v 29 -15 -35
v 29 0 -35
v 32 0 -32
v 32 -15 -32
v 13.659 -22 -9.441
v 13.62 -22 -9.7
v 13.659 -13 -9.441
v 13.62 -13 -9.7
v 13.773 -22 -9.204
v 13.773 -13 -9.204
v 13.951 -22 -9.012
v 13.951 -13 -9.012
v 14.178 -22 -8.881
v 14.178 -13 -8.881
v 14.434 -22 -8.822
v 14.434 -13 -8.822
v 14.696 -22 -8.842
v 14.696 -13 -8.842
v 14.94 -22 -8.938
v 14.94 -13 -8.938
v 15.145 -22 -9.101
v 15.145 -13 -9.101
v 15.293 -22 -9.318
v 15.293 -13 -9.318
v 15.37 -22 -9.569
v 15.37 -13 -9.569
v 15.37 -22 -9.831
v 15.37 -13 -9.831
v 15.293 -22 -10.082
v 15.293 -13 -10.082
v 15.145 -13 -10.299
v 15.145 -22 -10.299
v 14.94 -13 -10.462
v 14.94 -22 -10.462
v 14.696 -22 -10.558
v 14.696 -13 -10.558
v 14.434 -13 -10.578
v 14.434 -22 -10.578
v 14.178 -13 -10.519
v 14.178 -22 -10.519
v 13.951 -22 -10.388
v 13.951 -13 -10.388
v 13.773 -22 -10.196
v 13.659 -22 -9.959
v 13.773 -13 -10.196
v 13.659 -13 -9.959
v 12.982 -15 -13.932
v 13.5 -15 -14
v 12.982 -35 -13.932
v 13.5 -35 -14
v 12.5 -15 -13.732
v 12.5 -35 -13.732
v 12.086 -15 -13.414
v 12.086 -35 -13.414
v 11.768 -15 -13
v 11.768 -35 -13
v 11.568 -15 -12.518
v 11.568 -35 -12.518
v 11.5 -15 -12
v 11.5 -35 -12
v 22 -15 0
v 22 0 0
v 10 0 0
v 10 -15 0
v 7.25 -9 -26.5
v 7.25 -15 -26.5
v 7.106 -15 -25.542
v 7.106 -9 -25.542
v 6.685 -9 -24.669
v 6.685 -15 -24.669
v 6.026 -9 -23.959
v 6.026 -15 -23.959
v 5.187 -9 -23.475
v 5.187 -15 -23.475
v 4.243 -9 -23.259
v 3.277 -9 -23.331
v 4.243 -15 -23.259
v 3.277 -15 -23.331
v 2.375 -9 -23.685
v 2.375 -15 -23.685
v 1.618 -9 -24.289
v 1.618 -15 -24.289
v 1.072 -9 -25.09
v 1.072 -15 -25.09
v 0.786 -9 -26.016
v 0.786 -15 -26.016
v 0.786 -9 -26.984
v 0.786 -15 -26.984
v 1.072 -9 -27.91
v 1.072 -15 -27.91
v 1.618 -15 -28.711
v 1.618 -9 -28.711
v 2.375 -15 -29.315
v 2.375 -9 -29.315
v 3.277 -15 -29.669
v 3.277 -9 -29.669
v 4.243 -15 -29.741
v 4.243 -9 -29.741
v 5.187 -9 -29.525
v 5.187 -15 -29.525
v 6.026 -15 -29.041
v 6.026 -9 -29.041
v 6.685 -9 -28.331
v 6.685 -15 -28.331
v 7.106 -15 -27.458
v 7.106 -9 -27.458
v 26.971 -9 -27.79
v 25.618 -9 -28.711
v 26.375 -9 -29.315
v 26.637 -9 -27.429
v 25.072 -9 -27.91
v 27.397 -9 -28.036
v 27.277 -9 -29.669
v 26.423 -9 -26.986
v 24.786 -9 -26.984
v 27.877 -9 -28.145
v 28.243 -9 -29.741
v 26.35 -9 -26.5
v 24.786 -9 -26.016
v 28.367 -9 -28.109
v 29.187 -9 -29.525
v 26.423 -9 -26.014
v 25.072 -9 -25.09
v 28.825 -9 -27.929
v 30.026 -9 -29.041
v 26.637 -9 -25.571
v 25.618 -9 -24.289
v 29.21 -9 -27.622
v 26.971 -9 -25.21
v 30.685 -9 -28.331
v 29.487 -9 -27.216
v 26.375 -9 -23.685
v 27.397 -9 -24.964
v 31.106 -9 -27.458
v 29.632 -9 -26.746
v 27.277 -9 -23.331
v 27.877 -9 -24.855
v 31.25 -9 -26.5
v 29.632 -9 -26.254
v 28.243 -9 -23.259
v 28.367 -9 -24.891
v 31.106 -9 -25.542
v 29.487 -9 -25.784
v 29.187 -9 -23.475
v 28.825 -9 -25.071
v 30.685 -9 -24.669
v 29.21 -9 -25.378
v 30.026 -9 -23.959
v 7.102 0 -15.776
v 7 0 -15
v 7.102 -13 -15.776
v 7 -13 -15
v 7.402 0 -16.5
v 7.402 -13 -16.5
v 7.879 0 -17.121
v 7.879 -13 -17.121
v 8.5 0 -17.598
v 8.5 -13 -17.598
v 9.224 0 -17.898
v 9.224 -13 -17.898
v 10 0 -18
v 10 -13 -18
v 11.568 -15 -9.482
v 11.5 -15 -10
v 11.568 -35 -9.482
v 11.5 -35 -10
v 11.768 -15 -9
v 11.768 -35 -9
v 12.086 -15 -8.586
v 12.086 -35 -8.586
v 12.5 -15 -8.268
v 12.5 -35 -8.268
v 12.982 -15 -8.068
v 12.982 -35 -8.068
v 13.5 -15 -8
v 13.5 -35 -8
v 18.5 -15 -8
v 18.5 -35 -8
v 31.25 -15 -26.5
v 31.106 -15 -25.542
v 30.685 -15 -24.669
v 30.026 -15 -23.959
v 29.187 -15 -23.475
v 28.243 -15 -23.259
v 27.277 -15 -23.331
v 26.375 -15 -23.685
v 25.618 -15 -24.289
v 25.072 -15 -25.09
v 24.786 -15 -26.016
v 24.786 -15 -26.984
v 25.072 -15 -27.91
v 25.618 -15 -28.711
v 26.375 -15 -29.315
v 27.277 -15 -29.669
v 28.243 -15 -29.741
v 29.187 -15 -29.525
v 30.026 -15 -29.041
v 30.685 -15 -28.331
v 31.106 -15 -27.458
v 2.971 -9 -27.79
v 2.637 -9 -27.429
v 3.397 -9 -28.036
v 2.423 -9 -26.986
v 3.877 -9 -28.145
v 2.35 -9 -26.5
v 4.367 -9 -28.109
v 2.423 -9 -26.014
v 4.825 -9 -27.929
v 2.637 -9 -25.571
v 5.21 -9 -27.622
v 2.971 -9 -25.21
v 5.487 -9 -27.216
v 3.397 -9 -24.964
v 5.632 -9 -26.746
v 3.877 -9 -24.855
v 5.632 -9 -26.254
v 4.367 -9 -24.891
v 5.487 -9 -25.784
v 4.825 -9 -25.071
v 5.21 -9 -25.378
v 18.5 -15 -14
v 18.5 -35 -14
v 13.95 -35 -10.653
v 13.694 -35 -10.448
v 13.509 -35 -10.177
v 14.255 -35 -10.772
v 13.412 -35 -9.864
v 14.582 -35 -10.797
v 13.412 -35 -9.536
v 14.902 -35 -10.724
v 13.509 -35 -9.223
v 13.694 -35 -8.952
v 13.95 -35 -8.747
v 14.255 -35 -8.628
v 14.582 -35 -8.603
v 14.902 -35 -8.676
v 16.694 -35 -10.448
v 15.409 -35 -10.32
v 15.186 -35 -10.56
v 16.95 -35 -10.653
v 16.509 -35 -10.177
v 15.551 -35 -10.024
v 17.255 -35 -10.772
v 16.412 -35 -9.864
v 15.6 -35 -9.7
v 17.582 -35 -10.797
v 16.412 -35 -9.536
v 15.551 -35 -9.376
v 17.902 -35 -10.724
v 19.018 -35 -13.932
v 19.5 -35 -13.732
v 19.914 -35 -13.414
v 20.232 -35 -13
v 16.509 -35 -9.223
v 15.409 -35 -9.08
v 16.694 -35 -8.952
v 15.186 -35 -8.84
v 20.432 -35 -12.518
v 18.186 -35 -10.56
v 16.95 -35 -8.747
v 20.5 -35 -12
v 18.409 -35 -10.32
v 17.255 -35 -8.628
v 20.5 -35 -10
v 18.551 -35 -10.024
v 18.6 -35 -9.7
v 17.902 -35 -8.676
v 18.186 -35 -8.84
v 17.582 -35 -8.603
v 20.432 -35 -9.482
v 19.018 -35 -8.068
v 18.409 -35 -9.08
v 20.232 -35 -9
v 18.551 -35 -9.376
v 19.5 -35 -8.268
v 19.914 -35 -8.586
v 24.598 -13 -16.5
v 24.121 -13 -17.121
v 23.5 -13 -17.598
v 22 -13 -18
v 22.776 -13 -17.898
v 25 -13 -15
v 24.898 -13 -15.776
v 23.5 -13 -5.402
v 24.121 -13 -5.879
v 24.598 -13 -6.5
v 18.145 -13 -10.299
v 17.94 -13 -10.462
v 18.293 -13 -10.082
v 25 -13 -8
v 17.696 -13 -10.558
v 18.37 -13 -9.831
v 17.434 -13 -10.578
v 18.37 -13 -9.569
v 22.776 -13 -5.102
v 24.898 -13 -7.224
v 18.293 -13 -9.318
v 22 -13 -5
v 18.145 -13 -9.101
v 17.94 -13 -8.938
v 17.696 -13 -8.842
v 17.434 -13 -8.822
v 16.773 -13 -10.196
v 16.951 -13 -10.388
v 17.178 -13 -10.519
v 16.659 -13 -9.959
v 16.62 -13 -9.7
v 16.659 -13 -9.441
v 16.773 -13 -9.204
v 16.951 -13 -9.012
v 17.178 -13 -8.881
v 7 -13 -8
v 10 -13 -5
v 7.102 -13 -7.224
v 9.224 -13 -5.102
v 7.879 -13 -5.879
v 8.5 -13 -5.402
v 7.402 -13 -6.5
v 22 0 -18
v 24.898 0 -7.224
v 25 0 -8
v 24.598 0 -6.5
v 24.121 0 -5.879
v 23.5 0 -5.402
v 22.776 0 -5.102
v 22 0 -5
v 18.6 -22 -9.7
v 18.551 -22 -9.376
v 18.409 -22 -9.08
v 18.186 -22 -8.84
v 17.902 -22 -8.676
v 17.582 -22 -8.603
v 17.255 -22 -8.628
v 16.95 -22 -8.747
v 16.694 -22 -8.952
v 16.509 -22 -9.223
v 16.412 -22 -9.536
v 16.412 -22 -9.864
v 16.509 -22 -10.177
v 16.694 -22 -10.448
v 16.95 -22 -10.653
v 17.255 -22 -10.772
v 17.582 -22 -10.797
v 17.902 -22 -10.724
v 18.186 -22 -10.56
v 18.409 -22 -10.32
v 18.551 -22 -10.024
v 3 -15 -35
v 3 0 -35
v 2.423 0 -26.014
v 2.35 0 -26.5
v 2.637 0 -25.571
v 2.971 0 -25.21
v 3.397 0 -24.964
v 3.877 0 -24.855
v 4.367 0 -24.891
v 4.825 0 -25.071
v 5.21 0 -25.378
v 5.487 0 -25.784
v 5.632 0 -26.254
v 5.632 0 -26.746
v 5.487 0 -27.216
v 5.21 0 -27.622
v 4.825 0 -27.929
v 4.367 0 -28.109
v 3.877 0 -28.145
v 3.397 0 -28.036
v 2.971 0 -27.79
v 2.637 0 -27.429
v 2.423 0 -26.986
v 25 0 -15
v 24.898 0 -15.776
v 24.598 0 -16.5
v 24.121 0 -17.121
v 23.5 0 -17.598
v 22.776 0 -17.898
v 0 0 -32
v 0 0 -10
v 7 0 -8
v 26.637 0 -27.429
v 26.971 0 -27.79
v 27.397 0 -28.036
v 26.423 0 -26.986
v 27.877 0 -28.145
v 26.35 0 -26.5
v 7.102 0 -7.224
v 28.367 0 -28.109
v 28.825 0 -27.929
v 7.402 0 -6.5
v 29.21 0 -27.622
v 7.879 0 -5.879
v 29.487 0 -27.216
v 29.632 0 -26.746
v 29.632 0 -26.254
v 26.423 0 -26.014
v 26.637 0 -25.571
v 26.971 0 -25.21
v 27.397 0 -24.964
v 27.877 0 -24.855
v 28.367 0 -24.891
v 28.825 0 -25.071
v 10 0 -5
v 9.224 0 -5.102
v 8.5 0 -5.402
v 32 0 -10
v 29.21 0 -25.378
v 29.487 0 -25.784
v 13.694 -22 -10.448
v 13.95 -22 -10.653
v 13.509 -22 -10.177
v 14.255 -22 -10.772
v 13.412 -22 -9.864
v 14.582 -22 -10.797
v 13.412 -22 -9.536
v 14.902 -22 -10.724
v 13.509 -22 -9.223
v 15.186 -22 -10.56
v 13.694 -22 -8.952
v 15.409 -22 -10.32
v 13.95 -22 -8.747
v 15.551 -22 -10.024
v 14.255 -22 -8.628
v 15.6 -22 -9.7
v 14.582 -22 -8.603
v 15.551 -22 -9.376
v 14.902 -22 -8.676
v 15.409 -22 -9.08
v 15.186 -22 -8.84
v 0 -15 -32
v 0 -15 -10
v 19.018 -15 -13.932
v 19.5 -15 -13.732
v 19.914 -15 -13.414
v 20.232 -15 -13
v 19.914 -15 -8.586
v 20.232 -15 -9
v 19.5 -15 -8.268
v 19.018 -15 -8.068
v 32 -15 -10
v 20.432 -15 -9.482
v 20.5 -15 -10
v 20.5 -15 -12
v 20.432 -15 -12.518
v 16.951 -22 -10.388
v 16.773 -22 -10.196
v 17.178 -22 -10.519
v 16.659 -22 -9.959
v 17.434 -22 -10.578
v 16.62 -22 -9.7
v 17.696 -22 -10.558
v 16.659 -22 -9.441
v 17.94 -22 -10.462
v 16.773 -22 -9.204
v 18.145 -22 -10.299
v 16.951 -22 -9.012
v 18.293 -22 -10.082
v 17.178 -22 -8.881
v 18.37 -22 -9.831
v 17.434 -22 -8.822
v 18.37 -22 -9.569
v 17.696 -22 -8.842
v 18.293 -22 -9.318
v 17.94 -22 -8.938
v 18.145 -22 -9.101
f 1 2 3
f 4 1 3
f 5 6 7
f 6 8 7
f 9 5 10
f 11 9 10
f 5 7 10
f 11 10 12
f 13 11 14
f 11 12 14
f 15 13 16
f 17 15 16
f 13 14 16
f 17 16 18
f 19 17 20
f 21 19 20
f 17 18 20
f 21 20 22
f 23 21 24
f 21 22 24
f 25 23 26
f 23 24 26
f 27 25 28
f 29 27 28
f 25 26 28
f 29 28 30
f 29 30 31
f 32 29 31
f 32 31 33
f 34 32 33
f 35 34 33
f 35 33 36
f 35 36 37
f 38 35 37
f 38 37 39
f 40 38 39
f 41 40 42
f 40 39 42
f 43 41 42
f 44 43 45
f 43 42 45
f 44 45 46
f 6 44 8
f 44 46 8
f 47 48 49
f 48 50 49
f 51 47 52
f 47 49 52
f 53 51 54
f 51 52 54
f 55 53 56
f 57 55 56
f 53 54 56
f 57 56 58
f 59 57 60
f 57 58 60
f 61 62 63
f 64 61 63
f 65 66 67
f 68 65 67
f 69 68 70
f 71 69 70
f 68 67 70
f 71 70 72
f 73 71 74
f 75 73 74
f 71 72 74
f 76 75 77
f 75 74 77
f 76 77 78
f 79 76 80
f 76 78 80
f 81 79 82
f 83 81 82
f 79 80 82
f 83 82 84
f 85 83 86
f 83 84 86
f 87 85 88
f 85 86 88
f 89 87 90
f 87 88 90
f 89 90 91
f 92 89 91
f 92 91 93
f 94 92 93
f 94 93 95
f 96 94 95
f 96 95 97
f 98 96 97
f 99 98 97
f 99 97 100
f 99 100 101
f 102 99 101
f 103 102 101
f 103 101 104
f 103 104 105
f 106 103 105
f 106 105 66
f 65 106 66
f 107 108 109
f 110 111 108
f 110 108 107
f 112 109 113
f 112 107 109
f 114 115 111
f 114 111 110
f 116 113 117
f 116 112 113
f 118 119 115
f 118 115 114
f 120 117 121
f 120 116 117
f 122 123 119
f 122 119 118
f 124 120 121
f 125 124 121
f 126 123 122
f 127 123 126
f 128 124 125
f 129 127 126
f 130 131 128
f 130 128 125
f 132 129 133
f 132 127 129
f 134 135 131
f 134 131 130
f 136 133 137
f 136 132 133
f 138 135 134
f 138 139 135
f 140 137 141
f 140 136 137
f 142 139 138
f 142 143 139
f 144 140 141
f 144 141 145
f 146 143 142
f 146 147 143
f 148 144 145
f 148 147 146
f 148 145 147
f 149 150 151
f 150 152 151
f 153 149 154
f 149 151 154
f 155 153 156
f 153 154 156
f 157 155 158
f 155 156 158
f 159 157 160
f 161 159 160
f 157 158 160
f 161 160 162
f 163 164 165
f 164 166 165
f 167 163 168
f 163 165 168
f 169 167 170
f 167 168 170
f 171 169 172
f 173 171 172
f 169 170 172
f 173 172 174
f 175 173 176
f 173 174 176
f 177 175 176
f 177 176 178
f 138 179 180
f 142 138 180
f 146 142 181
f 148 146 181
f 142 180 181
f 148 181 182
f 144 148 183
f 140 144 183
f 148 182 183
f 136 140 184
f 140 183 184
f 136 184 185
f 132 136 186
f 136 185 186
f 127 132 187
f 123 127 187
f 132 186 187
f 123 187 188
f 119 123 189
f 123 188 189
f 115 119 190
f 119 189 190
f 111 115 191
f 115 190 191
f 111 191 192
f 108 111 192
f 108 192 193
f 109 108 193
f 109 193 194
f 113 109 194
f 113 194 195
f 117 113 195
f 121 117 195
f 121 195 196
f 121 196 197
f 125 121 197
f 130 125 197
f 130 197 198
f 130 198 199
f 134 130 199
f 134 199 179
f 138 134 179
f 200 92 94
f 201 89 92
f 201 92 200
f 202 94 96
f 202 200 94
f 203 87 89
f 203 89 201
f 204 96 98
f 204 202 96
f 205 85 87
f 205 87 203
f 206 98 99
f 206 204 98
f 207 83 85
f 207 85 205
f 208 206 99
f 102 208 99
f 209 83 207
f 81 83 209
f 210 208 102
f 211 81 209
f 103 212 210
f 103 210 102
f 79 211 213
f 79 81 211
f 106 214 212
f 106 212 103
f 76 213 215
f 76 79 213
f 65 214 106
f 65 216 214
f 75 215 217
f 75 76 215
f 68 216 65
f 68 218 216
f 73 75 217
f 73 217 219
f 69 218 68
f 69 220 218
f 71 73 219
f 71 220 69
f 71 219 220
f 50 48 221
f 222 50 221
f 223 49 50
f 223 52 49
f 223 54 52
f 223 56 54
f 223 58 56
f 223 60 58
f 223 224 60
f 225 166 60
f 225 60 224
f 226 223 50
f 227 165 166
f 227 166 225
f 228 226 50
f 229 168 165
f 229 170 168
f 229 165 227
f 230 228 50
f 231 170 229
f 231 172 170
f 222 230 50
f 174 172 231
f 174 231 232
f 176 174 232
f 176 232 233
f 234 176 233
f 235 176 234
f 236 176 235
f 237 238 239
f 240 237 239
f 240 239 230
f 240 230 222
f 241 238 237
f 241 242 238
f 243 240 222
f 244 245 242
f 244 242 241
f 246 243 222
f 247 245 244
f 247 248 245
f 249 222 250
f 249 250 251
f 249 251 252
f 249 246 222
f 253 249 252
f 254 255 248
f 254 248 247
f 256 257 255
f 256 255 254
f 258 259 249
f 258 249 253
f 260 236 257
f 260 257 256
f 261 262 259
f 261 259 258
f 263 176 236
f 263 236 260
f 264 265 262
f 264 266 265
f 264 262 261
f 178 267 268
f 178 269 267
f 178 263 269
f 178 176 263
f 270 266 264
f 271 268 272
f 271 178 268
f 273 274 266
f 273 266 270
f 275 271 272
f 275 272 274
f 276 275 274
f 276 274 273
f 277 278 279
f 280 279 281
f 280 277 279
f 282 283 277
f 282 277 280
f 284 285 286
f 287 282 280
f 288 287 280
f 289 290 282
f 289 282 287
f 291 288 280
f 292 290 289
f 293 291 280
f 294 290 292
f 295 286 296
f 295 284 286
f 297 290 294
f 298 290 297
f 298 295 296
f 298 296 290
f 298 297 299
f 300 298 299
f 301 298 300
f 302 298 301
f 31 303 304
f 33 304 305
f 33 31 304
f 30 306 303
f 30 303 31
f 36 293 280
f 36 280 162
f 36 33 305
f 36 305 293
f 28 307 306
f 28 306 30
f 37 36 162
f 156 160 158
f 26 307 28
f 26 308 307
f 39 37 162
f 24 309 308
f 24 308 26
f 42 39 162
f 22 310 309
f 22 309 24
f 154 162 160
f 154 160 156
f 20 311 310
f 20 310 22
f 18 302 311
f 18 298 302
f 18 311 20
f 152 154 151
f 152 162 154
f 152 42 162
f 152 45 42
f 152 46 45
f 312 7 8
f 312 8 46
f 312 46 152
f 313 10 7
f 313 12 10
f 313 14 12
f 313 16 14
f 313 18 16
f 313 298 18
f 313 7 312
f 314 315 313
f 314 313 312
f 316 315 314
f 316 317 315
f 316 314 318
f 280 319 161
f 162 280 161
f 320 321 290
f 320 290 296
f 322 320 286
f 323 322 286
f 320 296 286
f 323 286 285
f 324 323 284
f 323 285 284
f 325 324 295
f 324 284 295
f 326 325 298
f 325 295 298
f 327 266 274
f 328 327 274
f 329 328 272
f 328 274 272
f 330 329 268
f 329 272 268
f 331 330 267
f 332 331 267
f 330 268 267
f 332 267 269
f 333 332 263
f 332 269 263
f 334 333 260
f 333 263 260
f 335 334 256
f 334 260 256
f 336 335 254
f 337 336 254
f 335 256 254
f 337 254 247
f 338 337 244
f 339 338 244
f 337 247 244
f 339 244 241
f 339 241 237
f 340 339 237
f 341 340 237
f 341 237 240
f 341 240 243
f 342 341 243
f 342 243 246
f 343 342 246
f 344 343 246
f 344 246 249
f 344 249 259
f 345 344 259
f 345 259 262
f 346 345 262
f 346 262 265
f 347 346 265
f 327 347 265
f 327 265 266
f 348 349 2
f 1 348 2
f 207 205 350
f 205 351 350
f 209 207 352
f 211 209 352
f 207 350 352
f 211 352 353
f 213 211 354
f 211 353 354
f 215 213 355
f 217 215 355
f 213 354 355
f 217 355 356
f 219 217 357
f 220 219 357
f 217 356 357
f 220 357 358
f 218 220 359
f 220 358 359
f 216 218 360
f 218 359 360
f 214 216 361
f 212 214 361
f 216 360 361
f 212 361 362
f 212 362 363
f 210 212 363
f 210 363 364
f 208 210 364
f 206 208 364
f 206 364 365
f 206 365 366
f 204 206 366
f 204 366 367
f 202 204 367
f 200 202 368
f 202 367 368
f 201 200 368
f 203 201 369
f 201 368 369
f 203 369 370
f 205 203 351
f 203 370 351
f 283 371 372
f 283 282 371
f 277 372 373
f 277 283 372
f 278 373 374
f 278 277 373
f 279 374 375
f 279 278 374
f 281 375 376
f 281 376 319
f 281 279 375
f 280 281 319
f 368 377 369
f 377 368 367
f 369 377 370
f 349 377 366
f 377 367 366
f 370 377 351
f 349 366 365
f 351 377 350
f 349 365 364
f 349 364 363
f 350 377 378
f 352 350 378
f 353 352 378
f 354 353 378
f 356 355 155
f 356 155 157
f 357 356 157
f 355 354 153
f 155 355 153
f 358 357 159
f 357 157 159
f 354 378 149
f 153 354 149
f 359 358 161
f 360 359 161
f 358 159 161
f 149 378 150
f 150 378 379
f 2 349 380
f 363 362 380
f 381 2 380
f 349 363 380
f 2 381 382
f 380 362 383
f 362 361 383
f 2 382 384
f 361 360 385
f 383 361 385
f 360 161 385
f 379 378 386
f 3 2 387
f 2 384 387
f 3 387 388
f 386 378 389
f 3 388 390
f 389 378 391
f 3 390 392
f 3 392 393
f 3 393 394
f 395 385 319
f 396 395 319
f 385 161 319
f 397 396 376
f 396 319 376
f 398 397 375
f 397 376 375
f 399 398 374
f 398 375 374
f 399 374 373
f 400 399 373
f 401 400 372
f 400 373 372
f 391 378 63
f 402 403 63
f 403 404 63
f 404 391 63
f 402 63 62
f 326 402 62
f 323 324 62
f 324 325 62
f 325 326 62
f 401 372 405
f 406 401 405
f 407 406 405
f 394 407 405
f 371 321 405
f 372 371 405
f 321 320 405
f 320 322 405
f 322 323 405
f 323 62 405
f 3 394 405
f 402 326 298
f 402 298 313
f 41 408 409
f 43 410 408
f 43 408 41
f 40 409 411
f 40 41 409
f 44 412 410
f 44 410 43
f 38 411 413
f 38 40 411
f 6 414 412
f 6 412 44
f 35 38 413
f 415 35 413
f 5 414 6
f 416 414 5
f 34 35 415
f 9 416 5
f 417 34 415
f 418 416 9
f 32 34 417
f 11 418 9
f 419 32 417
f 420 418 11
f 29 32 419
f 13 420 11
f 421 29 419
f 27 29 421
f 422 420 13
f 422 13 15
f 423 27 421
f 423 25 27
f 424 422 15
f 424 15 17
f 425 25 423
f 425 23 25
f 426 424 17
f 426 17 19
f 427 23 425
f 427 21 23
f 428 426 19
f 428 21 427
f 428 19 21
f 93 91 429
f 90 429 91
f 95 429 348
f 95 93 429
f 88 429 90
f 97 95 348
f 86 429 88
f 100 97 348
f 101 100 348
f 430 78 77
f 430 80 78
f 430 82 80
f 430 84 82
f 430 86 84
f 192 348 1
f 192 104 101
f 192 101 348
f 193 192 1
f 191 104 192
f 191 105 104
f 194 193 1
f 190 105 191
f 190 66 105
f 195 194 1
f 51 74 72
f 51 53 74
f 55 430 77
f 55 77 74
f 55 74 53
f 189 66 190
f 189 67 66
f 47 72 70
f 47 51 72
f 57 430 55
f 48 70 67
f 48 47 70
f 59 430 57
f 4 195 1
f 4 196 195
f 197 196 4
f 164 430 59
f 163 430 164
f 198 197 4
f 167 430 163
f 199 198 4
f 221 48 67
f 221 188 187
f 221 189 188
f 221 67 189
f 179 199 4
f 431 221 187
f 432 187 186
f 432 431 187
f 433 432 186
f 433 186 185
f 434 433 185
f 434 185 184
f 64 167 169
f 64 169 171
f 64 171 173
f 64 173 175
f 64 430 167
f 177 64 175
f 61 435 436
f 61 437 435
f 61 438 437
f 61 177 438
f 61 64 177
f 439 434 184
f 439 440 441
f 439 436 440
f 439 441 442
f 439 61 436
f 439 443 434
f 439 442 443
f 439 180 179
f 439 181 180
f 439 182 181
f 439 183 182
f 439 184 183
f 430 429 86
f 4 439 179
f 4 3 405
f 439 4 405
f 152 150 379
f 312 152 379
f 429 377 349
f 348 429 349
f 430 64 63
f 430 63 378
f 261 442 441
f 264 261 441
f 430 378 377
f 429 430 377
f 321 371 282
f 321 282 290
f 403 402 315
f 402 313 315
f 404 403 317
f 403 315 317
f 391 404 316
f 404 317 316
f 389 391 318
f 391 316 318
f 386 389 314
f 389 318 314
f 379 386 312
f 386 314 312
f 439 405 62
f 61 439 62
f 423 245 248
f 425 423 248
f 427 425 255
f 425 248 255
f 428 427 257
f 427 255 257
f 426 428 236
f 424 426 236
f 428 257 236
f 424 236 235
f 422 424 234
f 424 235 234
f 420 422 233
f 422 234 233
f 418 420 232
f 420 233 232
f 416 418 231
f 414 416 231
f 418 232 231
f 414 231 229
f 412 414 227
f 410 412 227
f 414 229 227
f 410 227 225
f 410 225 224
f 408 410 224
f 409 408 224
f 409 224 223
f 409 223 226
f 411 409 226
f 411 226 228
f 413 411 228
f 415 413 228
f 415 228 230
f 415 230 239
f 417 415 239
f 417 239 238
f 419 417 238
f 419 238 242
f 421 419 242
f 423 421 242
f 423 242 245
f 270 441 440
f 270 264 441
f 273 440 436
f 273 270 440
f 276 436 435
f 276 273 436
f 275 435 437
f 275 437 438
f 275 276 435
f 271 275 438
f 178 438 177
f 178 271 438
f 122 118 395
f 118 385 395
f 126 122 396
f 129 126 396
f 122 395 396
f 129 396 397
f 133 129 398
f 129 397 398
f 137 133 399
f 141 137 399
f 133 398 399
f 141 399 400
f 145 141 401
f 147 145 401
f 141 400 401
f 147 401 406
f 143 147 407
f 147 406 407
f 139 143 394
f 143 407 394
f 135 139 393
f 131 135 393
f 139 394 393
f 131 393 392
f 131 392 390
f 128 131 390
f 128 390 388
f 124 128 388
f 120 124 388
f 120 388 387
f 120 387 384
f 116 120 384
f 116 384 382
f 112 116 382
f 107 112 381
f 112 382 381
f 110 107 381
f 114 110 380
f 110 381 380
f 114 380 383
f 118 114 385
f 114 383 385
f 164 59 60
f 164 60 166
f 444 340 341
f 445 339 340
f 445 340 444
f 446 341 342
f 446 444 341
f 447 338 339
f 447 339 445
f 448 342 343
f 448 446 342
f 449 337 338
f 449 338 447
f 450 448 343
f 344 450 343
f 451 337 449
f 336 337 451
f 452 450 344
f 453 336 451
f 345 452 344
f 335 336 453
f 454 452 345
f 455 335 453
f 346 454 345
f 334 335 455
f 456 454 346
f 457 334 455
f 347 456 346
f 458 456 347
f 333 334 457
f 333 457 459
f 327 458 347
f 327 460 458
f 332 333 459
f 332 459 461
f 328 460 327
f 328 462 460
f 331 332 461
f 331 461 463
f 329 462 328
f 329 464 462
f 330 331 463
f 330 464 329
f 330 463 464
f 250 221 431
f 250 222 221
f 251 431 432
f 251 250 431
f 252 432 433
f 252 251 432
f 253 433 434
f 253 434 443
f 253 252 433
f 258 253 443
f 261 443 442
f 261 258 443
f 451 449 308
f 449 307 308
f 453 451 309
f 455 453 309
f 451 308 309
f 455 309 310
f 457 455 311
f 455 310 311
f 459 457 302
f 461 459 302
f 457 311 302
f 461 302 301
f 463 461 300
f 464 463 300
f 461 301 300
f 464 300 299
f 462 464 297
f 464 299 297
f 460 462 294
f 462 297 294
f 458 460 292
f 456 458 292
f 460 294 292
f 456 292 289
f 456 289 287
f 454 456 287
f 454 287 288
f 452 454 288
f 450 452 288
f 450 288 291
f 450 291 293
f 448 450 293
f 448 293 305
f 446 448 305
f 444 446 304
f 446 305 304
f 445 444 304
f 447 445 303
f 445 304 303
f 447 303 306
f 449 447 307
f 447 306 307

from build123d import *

# Parameters (mm, degrees)
F1_DEPTH       = 15
F2_W           = 9
F2_H           = 6
F3_DEPTH       = 20
F4_W           = 18
F4_H           = 13
F5_DEPTH       = 13
F6_R           = 3
F7_D           = 3.3
F7_CBORE_D     = 6.5
F7_CBORE_DEPTH = 6
F9_D           = 1.76
F9_CBORE_D     = 2.2
F9_CBORE_DEPTH = 13
F10_R          = 2


with BuildPart() as f1:
    # F0 (on Front) → F1 (new body)
    with BuildSketch(Plane.XZ):
        Polygon((22, 0), (10, 0), (0, -10), (0, -32), (3, -35), (29, -35), (32, -32), (32, -10), align=None)
    extrude(amount=F1_DEPTH)

    # F2 (on face) → F3 (join)
    with BuildSketch(Plane.XZ.offset(15)):
        with Locations((16, -11)):
            Rectangle(F2_W, F2_H)
    extrude(amount=F3_DEPTH)

    # F4 (on face) → F5 (cut)
    with BuildSketch(Plane(origin=(0, 0, 0), x_dir=(-1, 0, 0), z_dir=(0, 1, 0))):
        with Locations((-16, -11.5)):
            Rectangle(F4_W, F4_H)
    extrude(amount=-F5_DEPTH, mode=Mode.SUBTRACT)

    # F6
    f6_edges = [f1.edges().sort_by_distance(p)[0] for p in [
        (25, -6.5, -5),
        (7, -6.5, -5),
        (25, -6.5, -18),
        (7, -6.5, -18),
    ]]
    fillet(f6_edges, radius=F6_R)

    # F7 (through all)
    with Locations(Plane.XZ.offset(15)):
        with Locations((4, -26.5), (28, -26.5)):
            CounterBoreHole(F7_D / 2, F7_CBORE_D / 2, F7_CBORE_DEPTH)

    # F9 (through all)
    with Locations(Plane.XZ.offset(35)):
        with Locations((14.5, -9.7), (17.5, -9.7)):
            CounterBoreHole(F9_D / 2, F9_CBORE_D / 2, F9_CBORE_DEPTH)

    # F10
    f10_edges = [f1.edges().sort_by_distance(p)[0] for p in [
        (20.5, -25, -8),
        (20.5, -25, -14),
        (11.5, -25, -8),
        (11.5, -25, -14),
    ]]
    fillet(f10_edges, radius=F10_R)


solid = f1.part
